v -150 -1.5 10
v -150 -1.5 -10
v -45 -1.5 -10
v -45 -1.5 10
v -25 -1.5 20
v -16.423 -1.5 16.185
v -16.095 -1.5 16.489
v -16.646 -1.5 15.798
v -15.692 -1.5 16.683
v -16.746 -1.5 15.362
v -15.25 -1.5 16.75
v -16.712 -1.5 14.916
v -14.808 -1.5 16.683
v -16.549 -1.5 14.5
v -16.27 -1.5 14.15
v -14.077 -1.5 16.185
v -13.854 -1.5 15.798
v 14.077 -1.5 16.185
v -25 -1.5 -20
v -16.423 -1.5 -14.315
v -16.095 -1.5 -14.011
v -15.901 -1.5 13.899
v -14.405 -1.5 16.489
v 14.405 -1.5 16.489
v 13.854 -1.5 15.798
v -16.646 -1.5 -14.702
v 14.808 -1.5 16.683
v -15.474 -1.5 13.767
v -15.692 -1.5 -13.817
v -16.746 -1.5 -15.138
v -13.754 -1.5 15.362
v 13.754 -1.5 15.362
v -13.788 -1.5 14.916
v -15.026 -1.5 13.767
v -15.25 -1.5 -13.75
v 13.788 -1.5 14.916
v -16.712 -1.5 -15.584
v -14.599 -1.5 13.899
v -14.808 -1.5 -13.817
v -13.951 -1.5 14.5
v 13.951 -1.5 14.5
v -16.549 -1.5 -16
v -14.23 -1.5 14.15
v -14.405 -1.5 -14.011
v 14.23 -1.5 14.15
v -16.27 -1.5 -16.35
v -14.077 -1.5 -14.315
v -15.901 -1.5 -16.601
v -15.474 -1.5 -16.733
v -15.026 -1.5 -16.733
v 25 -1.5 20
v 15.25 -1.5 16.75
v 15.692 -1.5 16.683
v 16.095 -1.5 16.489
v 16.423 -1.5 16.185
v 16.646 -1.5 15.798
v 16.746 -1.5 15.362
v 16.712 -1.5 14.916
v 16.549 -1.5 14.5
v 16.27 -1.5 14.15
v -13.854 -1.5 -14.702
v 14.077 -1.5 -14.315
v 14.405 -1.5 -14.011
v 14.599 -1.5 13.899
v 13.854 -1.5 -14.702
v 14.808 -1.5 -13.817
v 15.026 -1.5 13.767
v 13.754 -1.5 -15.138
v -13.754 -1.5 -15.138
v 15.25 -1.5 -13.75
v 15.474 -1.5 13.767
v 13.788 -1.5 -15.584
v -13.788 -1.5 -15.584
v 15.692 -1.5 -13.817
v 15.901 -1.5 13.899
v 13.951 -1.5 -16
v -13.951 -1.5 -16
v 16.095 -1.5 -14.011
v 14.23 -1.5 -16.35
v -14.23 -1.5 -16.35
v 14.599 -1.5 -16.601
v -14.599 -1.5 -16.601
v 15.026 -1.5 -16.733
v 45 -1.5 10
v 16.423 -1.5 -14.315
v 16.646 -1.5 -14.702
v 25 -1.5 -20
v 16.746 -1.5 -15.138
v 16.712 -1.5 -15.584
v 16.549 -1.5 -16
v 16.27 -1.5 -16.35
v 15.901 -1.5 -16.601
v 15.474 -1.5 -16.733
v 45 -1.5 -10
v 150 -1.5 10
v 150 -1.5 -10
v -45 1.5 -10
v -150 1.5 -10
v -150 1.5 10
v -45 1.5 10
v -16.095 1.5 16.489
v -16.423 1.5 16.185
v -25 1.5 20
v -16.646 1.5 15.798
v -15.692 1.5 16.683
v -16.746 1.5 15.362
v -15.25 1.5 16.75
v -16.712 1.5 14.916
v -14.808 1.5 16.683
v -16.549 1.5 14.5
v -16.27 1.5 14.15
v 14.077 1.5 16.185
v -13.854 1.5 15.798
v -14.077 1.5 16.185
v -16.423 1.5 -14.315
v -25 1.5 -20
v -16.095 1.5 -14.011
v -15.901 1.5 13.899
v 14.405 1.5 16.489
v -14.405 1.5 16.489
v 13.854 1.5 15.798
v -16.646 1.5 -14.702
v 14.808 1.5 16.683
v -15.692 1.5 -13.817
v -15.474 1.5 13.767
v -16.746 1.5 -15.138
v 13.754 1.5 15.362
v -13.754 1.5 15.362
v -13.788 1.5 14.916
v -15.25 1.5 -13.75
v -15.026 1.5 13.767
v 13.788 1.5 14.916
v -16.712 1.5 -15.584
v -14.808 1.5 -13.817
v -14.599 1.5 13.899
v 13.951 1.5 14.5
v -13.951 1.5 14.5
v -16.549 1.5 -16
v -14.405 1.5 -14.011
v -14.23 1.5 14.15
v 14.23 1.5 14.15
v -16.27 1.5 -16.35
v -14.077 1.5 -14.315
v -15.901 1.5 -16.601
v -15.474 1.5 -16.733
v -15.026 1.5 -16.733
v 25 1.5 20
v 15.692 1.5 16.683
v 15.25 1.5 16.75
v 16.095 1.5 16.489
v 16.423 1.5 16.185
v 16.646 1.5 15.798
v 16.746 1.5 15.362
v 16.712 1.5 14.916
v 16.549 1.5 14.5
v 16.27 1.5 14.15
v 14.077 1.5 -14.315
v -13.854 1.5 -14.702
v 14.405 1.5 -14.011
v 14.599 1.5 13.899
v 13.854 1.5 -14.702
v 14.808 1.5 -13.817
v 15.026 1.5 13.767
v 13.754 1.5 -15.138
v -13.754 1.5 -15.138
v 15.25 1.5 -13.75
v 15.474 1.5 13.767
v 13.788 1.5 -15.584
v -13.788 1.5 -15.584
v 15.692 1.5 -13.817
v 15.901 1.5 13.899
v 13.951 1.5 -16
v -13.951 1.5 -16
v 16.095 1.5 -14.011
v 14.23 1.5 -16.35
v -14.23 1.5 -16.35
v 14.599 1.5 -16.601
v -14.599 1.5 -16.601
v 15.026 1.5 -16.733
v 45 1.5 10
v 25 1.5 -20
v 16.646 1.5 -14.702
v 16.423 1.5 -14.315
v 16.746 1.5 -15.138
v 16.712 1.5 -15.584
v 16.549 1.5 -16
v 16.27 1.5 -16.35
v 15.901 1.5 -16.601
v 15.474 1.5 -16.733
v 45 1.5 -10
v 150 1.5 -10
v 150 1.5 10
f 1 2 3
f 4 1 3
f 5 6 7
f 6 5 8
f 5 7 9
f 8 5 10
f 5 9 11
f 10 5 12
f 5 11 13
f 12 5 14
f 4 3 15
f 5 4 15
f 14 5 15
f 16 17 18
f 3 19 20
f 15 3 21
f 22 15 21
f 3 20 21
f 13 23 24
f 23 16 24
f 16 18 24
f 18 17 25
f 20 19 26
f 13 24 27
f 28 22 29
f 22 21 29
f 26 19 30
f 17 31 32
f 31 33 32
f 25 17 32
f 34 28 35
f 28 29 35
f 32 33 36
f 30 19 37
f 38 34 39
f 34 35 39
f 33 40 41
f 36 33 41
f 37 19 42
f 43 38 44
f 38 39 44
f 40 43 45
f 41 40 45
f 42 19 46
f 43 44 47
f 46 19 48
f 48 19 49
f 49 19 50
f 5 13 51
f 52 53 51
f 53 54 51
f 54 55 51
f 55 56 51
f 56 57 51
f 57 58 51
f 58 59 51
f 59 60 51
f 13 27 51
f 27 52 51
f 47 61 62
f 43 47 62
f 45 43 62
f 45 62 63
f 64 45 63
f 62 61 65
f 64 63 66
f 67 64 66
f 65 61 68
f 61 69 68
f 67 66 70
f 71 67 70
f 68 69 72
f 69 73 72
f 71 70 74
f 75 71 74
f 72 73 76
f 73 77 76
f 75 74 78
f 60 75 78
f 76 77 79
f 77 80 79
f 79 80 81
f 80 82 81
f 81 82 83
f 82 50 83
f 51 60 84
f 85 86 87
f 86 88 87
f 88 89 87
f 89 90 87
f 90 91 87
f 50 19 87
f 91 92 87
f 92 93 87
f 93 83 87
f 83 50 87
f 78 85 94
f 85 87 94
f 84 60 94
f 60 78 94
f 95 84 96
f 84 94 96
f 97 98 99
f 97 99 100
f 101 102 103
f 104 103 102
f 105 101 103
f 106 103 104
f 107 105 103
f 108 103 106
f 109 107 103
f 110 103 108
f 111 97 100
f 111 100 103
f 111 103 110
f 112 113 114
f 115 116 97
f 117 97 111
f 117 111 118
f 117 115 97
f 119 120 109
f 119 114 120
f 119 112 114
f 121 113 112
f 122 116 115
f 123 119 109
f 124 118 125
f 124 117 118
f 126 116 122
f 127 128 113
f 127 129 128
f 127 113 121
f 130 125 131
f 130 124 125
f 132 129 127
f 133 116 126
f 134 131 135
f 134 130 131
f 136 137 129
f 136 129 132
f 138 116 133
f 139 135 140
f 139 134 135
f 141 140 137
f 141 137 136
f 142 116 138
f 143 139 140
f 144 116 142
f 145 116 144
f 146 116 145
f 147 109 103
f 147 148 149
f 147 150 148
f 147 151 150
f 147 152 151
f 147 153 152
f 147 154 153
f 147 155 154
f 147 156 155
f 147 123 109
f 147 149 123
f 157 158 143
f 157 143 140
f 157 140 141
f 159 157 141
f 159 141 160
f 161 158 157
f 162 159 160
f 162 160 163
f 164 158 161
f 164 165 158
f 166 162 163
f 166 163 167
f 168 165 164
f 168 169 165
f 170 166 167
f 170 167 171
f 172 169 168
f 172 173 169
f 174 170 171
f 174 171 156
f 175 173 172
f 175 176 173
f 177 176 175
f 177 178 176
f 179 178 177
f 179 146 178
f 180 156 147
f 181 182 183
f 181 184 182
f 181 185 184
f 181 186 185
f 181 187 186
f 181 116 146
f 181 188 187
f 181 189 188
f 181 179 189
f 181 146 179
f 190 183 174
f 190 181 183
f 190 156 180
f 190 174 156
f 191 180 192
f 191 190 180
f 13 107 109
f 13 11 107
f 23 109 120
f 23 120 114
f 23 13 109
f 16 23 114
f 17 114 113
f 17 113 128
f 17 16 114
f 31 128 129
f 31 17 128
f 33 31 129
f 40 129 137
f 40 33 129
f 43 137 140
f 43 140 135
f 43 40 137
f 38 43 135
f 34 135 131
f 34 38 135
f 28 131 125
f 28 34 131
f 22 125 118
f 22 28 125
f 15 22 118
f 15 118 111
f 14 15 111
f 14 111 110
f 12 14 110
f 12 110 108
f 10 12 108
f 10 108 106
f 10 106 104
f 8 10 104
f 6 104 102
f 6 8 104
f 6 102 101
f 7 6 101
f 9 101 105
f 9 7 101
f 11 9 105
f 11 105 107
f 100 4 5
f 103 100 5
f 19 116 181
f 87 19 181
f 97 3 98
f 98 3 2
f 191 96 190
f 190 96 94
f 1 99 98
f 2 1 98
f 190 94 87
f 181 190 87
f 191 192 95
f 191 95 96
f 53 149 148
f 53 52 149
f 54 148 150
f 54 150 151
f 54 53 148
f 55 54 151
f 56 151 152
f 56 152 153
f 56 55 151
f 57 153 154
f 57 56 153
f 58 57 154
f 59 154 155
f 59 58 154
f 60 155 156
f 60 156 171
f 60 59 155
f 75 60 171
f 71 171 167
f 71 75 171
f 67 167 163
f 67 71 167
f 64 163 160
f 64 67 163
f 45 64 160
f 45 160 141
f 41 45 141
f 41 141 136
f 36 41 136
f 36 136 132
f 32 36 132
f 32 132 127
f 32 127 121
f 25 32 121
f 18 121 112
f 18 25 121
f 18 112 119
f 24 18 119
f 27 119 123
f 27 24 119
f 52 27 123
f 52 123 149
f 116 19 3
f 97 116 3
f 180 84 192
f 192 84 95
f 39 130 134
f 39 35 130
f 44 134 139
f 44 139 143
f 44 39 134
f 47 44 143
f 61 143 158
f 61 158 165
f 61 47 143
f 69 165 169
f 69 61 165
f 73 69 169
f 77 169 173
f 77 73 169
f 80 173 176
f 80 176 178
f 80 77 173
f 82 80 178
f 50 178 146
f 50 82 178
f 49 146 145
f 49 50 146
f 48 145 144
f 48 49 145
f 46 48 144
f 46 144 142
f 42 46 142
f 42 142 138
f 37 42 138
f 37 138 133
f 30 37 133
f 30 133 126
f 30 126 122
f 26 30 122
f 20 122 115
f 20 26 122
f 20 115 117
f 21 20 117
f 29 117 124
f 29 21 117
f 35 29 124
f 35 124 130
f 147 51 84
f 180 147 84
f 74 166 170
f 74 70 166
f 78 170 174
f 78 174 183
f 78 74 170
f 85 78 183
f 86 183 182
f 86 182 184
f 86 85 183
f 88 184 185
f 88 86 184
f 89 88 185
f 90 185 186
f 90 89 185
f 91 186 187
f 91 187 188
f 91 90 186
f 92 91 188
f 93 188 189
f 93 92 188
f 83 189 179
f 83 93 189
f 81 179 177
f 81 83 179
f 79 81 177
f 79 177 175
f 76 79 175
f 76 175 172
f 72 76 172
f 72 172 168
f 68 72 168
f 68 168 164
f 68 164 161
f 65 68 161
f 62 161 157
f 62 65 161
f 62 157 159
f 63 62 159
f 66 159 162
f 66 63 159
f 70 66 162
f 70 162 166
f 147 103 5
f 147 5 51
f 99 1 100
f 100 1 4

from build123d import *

# Parameters (mm, degrees)
SKETCH1_W           = 300
SKETCH1_H           = 40
SKETCH1_R           = 1.5
BOSS_EXTRUDE1_DEPTH = 1.5
CUT_EXTRUDE1_DEPTH  = 152.35719342


with BuildPart() as part:
    # Sketch1 → Boss-Extrude1 (new, symmetric)
    with BuildSketch(Plane(origin=(0, 0, 0), x_dir=(1, 0, 0), z_dir=(0, 1, 0))):
        Rectangle(SKETCH1_W, SKETCH1_H)
        with Locations(Location((-15.25, 15.25, 0), (0, 0, 270))):
            Circle(SKETCH1_R, mode=Mode.SUBTRACT)
        with Locations(Location((15.25, 15.25, 0), (0, 0, 270))):
            Circle(SKETCH1_R, mode=Mode.SUBTRACT)
        with Locations(Location((15.25, -15.25, 0), (0, 0, 270))):
            Circle(SKETCH1_R, mode=Mode.SUBTRACT)
        with Locations(Location((-15.25, -15.25, 0), (0, 0, 270))):
            Circle(SKETCH1_R, mode=Mode.SUBTRACT)
    extrude(amount=BOSS_EXTRUDE1_DEPTH, both=True)

    # Sketch2 → Cut-Extrude1 (cut, through all)
    with BuildSketch(Plane.XZ.offset(1.5)):
        Polygon((-150, 20), (-150, 10), (-45, 10), (-25, 20), align=None)
        Polygon((150, 20), (25, 20), (45, 10), (150, 10), align=None)
        Polygon((150, -20), (150, -10), (45, -10), (25, -20), align=None)
        Polygon((-150, -20), (-25, -20), (-45, -10), (-150, -10), align=None)
    extrude(amount=-CUT_EXTRUDE1_DEPTH, mode=Mode.SUBTRACT)


solid = part.part
